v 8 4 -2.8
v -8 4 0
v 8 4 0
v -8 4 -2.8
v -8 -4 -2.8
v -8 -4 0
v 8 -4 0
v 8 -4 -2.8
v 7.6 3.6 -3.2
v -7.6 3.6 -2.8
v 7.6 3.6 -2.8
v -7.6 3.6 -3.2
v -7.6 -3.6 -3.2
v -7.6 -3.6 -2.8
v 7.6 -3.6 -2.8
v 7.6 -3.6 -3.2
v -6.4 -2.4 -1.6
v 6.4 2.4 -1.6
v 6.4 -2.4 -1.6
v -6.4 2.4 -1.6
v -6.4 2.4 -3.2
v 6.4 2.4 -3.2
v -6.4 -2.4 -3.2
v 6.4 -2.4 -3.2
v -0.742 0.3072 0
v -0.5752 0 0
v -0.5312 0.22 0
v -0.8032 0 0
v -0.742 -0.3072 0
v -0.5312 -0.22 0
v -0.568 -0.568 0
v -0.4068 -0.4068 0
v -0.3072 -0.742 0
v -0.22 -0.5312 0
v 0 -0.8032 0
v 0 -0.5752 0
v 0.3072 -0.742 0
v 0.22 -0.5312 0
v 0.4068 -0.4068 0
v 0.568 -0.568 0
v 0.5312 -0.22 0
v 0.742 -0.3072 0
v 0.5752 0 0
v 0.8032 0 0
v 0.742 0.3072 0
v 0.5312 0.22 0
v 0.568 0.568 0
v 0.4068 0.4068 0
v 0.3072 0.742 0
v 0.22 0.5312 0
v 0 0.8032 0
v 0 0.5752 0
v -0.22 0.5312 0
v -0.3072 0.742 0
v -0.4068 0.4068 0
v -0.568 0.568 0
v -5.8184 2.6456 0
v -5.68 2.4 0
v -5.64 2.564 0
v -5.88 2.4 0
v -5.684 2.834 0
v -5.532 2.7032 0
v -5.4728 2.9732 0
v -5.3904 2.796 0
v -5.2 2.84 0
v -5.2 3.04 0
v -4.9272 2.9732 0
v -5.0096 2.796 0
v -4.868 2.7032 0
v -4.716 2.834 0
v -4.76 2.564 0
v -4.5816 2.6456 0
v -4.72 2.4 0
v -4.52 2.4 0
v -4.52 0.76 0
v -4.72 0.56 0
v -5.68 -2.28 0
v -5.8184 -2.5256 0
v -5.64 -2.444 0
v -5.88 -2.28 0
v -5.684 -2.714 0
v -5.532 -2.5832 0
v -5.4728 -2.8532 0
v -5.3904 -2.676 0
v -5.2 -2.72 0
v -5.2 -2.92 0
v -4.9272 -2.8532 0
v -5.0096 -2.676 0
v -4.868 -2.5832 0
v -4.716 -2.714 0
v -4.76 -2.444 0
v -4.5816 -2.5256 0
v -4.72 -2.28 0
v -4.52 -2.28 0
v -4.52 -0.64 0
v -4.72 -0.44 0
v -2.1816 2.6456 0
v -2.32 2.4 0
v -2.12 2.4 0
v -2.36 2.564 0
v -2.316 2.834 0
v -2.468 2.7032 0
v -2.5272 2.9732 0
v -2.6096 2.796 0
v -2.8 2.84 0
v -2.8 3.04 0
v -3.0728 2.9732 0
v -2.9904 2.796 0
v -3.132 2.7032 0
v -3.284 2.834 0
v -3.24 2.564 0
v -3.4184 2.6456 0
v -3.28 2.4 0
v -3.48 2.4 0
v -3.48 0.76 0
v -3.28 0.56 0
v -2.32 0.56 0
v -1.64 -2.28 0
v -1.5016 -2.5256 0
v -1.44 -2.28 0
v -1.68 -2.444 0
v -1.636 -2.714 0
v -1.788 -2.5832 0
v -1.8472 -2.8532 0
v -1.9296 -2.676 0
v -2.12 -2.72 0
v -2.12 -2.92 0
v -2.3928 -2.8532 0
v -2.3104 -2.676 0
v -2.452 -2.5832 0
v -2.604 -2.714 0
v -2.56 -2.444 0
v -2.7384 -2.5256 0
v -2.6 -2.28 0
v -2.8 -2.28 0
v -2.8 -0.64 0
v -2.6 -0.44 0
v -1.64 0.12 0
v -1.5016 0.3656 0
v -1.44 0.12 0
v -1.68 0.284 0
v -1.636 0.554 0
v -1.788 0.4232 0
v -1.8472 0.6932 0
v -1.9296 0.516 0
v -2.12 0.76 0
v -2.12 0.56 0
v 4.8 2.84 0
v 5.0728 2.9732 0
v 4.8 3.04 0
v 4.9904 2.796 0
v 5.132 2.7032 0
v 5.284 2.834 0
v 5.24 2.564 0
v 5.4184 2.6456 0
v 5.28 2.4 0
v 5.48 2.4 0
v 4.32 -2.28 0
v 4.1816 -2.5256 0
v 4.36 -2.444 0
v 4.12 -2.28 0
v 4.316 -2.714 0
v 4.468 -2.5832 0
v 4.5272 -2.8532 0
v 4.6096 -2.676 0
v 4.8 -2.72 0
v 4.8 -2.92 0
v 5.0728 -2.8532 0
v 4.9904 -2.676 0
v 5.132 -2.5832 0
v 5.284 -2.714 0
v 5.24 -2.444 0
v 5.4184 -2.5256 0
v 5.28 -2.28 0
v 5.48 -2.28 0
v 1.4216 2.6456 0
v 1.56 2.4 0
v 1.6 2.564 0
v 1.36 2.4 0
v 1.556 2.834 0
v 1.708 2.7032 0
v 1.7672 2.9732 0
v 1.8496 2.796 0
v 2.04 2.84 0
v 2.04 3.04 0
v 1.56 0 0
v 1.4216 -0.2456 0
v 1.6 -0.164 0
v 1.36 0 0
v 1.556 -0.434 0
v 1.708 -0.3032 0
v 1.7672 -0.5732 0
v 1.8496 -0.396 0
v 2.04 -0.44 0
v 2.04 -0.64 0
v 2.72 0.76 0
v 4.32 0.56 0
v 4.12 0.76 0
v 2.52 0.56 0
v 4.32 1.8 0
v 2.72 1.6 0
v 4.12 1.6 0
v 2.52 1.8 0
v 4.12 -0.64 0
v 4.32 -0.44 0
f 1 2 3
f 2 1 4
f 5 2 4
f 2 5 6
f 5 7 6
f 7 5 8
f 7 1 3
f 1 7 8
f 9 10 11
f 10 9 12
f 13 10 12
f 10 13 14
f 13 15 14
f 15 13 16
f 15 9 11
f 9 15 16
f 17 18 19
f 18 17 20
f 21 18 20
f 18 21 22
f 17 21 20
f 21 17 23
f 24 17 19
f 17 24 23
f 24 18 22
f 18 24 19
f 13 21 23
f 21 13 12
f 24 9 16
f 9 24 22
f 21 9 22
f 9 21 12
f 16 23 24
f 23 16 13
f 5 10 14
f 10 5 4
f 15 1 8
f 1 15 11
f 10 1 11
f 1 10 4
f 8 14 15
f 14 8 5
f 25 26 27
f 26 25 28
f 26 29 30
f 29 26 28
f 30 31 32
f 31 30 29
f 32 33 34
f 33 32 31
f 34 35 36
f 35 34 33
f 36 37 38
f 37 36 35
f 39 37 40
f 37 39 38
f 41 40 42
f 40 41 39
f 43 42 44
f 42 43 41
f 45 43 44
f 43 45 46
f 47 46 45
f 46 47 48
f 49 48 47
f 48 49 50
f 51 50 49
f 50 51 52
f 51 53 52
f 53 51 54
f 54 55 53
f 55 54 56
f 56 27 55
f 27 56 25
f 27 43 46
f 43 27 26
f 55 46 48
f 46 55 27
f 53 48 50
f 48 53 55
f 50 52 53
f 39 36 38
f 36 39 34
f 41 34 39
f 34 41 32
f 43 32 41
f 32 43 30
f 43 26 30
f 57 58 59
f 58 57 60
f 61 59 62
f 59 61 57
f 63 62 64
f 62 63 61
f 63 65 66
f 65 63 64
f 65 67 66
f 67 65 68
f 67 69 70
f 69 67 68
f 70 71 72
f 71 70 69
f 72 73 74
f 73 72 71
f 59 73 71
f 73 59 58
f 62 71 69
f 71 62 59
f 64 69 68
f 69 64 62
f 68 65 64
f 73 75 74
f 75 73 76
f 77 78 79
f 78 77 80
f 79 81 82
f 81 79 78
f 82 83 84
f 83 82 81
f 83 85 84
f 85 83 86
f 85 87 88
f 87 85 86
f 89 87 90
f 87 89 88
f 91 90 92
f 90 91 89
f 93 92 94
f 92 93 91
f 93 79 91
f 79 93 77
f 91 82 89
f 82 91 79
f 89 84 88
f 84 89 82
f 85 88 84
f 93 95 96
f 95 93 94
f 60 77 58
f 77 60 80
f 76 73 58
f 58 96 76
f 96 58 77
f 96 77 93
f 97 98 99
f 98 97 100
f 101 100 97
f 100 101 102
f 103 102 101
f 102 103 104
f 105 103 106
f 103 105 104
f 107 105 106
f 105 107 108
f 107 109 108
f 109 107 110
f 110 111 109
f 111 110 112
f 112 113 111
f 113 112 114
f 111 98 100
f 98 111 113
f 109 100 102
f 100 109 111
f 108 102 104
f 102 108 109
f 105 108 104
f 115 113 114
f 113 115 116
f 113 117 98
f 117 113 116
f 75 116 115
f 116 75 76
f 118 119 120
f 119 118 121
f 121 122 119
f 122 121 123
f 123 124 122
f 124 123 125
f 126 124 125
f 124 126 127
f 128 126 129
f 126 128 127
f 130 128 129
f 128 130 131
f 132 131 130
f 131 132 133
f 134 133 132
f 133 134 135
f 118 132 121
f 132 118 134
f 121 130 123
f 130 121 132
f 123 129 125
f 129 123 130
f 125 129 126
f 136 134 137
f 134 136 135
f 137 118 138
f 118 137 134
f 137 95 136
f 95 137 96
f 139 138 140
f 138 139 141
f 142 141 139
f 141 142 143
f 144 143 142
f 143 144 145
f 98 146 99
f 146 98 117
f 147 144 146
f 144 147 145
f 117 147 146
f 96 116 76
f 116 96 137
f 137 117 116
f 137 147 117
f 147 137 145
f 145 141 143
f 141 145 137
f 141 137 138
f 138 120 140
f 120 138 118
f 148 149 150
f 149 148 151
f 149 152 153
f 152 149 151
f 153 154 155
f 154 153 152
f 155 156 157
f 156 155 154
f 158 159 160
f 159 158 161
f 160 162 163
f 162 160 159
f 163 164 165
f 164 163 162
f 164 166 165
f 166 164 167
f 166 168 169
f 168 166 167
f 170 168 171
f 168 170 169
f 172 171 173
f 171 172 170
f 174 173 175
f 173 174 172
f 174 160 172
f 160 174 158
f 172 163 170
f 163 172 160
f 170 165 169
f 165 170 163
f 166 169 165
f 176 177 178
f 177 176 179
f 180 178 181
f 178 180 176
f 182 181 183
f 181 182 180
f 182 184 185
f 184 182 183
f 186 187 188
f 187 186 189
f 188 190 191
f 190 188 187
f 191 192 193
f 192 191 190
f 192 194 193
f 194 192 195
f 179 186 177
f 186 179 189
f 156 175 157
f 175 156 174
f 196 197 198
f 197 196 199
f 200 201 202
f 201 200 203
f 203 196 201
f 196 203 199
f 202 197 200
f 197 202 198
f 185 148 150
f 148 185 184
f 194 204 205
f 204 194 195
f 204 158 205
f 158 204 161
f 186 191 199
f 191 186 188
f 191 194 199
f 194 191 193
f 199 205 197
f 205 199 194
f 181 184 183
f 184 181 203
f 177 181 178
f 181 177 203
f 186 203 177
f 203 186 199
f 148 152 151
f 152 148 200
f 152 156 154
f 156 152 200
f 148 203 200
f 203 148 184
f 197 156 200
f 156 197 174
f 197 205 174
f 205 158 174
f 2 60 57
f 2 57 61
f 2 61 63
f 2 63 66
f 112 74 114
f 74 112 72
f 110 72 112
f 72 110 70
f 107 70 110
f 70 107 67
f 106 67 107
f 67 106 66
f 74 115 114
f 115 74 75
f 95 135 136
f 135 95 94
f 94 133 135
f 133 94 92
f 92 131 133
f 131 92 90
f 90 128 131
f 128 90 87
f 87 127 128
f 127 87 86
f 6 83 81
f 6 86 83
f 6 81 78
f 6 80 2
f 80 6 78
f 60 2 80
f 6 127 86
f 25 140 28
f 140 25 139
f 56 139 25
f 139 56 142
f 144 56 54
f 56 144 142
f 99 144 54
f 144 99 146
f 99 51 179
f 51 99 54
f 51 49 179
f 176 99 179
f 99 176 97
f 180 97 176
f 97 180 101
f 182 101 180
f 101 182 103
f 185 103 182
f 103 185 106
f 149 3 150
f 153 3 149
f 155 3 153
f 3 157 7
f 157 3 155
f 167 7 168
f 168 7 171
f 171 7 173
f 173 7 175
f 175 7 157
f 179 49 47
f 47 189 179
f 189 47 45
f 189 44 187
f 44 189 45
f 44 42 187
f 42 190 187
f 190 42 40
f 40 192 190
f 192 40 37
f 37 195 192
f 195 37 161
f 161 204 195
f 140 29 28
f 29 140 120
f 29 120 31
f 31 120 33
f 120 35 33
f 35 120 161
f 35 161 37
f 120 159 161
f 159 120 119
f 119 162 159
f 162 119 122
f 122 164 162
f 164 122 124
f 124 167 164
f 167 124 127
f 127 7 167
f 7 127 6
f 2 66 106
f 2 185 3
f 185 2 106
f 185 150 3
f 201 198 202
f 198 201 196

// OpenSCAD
// file: ../p/box5.scad
use <../lib.scad>
function ldraw_lib__box5() = [
// 0 Box with 5 Faces and All Edges
// 0 Name: box5.dat
// 0 Author: James Jessiman
// 0 !LDRAW_ORG Primitive UPDATE 2012-01
// 0 !LICENSE Licensed under CC BY 2.0 and CC BY 4.0 : see CAreadme.txt
// 
// 0 BFC CERTIFY CCW
  [0,"BFC","CERTIFY"],
  [0,"BFC","CCW"],
// 
// 0 !HISTORY 2002-04-03 [sbliss] Modified for BFC compliance
// 0 !HISTORY 2002-04-25 [PTadmin] Official Update 2002-02
// 0 !HISTORY 2007-06-24 [PTadmin] Header formatted for Contributor Agreement
// 0 !HISTORY 2008-07-01 [PTadmin] Official Update 2008-01
// 0 !HISTORY 2012-02-16 [Philo] Changed to CCW
// 0 !HISTORY 2012-03-30 [PTadmin] Official Update 2012-01
// 
// 
// 2 24 1 1 1 -1 1 1
  [2,24,1,1,1,-1,1,1],
// 2 24 -1 1 1 -1 1 -1
  [2,24,-1,1,1,-1,1,-1],
// 2 24 -1 1 -1 1 1 -1
  [2,24,-1,1,-1,1,1,-1],
// 2 24 1 1 -1 1 1 1
  [2,24,1,1,-1,1,1,1],
// 2 24 1 0 1 -1 0 1
  [2,24,1,0,1,-1,0,1],
// 2 24 -1 0 1 -1 0 -1
  [2,24,-1,0,1,-1,0,-1],
// 2 24 -1 0 -1 1 0 -1
  [2,24,-1,0,-1,1,0,-1],
// 2 24 1 0 -1 1 0 1
  [2,24,1,0,-1,1,0,1],
// 2 24 1 0 1 1 1 1
  [2,24,1,0,1,1,1,1],
// 2 24 -1 0 1 -1 1 1
  [2,24,-1,0,1,-1,1,1],
// 2 24 1 0 -1 1 1 -1
  [2,24,1,0,-1,1,1,-1],
// 2 24 -1 0 -1 -1 1 -1
  [2,24,-1,0,-1,-1,1,-1],
// 4 16 -1 1 1 1 1 1 1 1 -1 -1 1 -1
  [4,16,-1,1,1,1,1,1,1,1,-1,-1,1,-1],
// 4 16 -1 1 1 -1 0 1 1 0 1 1 1 1
  [4,16,-1,1,1,-1,0,1,1,0,1,1,1,1],
// 4 16 -1 1 -1 -1 0 -1 -1 0 1 -1 1 1
  [4,16,-1,1,-1,-1,0,-1,-1,0,1,-1,1,1],
// 4 16 1 1 -1 1 0 -1 -1 0 -1 -1 1 -1
  [4,16,1,1,-1,1,0,-1,-1,0,-1,-1,1,-1],
// 4 16 1 1 1 1 0 1 1 0 -1 1 1 -1
  [4,16,1,1,1,1,0,1,1,0,-1,1,1,-1],
];
module ldraw_lib__box5(step=0, col=false, unit=2/5, alt=false, line=0.2, solid=!$preview)
    makepoly(ldraw_lib__box5(), step=step, col=col, unit=unit, alt=alt, line=line, solid=solid);
ldraw_lib__box5(line=0.2);
// file: ../p/box4.scad
use <../lib.scad>
function ldraw_lib__box4() = [
// 0 Box with 4 Faces (2 Parallel Pairs) and All Edges
// 0 Name: box4.dat
// 0 Author: James Jessiman
// 0 !LDRAW_ORG Primitive UPDATE 2012-01
// 0 !LICENSE Licensed under CC BY 2.0 and CC BY 4.0 : see CAreadme.txt
// 
// 0 BFC CERTIFY CCW
  [0,"BFC","CERTIFY"],
  [0,"BFC","CCW"],
// 
// 0 !HISTORY 2002-04-03 [sbliss] Modified for BFC compliance
// 0 !HISTORY 2002-04-25 [PTadmin] Official Update 2002-02
// 0 !HISTORY 2007-06-24 [PTadmin] Header formatted for Contributor Agreement
// 0 !HISTORY 2008-07-01 [PTadmin] Official Update 2008-01
// 0 !HISTORY 2012-02-16 [Philo] Changed to CCW
// 0 !HISTORY 2012-03-30 [PTadmin] Official Update 2012-01
// 
// 
// 2 24 1 1 1 -1 1 1
  [2,24,1,1,1,-1,1,1],
// 2 24 -1 1 1 -1 1 -1
  [2,24,-1,1,1,-1,1,-1],
// 2 24 -1 1 -1 1 1 -1
  [2,24,-1,1,-1,1,1,-1],
// 2 24 1 1 -1 1 1 1
  [2,24,1,1,-1,1,1,1],
// 2 24 1 0 1 -1 0 1
  [2,24,1,0,1,-1,0,1],
// 2 24 -1 0 1 -1 0 -1
  [2,24,-1,0,1,-1,0,-1],
// 2 24 -1 0 -1 1 0 -1
  [2,24,-1,0,-1,1,0,-1],
// 2 24 1 0 -1 1 0 1
  [2,24,1,0,-1,1,0,1],
// 2 24 1 0 1 1 1 1
  [2,24,1,0,1,1,1,1],
// 2 24 -1 0 1 -1 1 1
  [2,24,-1,0,1,-1,1,1],
// 2 24 1 0 -1 1 1 -1
  [2,24,1,0,-1,1,1,-1],
// 2 24 -1 0 -1 -1 1 -1
  [2,24,-1,0,-1,-1,1,-1],
// 4 16 -1 1 1 -1 0 1 1 0 1 1 1 1
  [4,16,-1,1,1,-1,0,1,1,0,1,1,1,1],
// 4 16 -1 1 -1 -1 0 -1 -1 0 1 -1 1 1
  [4,16,-1,1,-1,-1,0,-1,-1,0,1,-1,1,1],
// 4 16 1 1 -1 1 0 -1 -1 0 -1 -1 1 -1
  [4,16,1,1,-1,1,0,-1,-1,0,-1,-1,1,-1],
// 4 16 1 1 1 1 0 1 1 0 -1 1 1 -1
  [4,16,1,1,1,1,0,1,1,0,-1,1,1,-1],
];
module ldraw_lib__box4(step=0, col=false, unit=2/5, alt=false, line=0.2, solid=!$preview)
    makepoly(ldraw_lib__box4(), step=step, col=col, unit=unit, alt=alt, line=line, solid=solid);
ldraw_lib__box4(line=0.2);
// file: s/3069bs01.scad
use <../../lib.scad>
use <../../p/box4.scad>
use <../../p/box5.scad>
function ldraw_lib__s__3069bs01() = [
// 0 ~Tile  1 x  2 with Groove without Top Face
// 0 Name: s\3069bs01.dat
// 0 Author: Santeri Piippo [arezey]
// 0 !LDRAW_ORG Subpart UPDATE 2010-02
// 0 !LICENSE Licensed under CC BY 2.0 and CC BY 4.0 : see CAreadme.txt
// 
// 0 BFC CERTIFY CCW
  [0,"BFC","CERTIFY"],
  [0,"BFC","CCW"],
// 
// 0 !HISTORY 2010-07-05 [PTadmin] Official Update 2010-02
// 
// 
// 1 16 0 0 0 20 0 0 0 7 0 0 0 10 box4.dat
  [1,16,0,0,0,20,0,0,0,7,0,0,0,10, ldraw_lib__box4()],
// 1 16 0 7 0 19 0 0 0 1 0 0 0 9 box4.dat
  [1,16,0,7,0,19,0,0,0,1,0,0,0,9, ldraw_lib__box4()],
// 0 BFC INVERTNEXT
  [0,"BFC","INVERTNEXT"],
// 1 16 0 8 0 16 0 0 0 -4 0 0 0 6 box5.dat
  [1,16,0,8,0,16,0,0,0,-4,0,0,0,6, ldraw_lib__box5()],
// 4 16 -19 8 9 -16 8 6 -16 8 -6 -19 8 -9
  [4,16,-19,8,9,-16,8,6,-16,8,-6,-19,8,-9],
// 4 16 19 8 -9 16 8 -6 16 8 6 19 8 9
  [4,16,19,8,-9,16,8,-6,16,8,6,19,8,9],
// 4 16 19 8 9 16 8 6 -16 8 6 -19 8 9
  [4,16,19,8,9,16,8,6,-16,8,6,-19,8,9],
// 4 16 -19 8 -9 -16 8 -6 16 8 -6 19 8 -9
  [4,16,-19,8,-9,-16,8,-6,16,8,-6,19,8,-9],
// 4 16 -20 7 10 -19 7 9 -19 7 -9 -20 7 -10
  [4,16,-20,7,10,-19,7,9,-19,7,-9,-20,7,-10],
// 4 16 20 7 -10 19 7 -9 19 7 9 20 7 10
  [4,16,20,7,-10,19,7,-9,19,7,9,20,7,10],
// 4 16 20 7 10 19 7 9 -19 7 9 -20 7 10
  [4,16,20,7,10,19,7,9,-19,7,9,-20,7,10],
// 4 16 -20 7 -10 -19 7 -9 19 7 -9 20 7 -10
  [4,16,-20,7,-10,-19,7,-9,19,7,-9,20,7,-10],
// 0 //
];
module ldraw_lib__s__3069bs01(step=0, col=false, unit=2/5, alt=false, line=0.2, solid=!$preview)
    makepoly(ldraw_lib__s__3069bs01(), step=step, col=col, unit=unit, alt=alt, line=line, solid=solid);
ldraw_lib__s__3069bs01(line=0.2);
// main file
use <../lib.scad>
use <s/3069bs01.scad>
function ldraw_lib__3069bpxa() = [
// 0 Tile  1 x  2 with White "K-9" Pattern
// 0 Name: 3069bpxa.dat
// 0 Author: Evert-Jan Boer [ejboer]
// 0 !LDRAW_ORG Part UPDATE 2022-04
// 0 !LICENSE Licensed under CC BY 2.0 and CC BY 4.0 : see CAreadme.txt
// 
// 0 BFC CERTIFY CCW
  [0,"BFC","CERTIFY"],
  [0,"BFC","CCW"],
// 
// 0 !KEYWORDS Bricklink 3069bpb425, Doctor Who, Set 71204
// 
// 0 !HISTORY 2022-07-18 [PTadmin] Official Update 2022-04
// 
// 
// 1 16 0 0 0 1 0 0 0 1 0 0 0 1 s\3069bs01.dat
  [1,16,0,0,0,1,0,0,0,1,0,0,0,1, ldraw_lib__s__3069bs01()],
// 
// 4 72 -1.438 0 0 -1.328 0 .55 -1.855 0 .768 -2.008 0 0
  [4,72,-1.438,0,0,-1.328,0,.55,-1.855,0,.768,-2.008,0,0],
// 4 72 -1.328 0 -.55 -1.438 0 0 -2.008 0 0 -1.855 0 -.768
  [4,72,-1.328,0,-.55,-1.438,0,0,-2.008,0,0,-1.855,0,-.768],
// 4 72 -1.017 0 -1.017 -1.328 0 -.55 -1.855 0 -.768 -1.42 0 -1.42
  [4,72,-1.017,0,-1.017,-1.328,0,-.55,-1.855,0,-.768,-1.42,0,-1.42],
// 4 72 -.55 0 -1.328 -1.017 0 -1.017 -1.42 0 -1.42 -.768 0 -1.855
  [4,72,-.55,0,-1.328,-1.017,0,-1.017,-1.42,0,-1.42,-.768,0,-1.855],
// 4 72 0 0 -1.438 -.55 0 -1.328 -.768 0 -1.855 0 0 -2.008
  [4,72,0,0,-1.438,-.55,0,-1.328,-.768,0,-1.855,0,0,-2.008],
// 4 72 .55 0 -1.328 0 0 -1.438 0 0 -2.008 .768 0 -1.855
  [4,72,.55,0,-1.328,0,0,-1.438,0,0,-2.008,.768,0,-1.855],
// 4 72 1.017 0 -1.017 .55 0 -1.328 .768 0 -1.855 1.42 0 -1.42
  [4,72,1.017,0,-1.017,.55,0,-1.328,.768,0,-1.855,1.42,0,-1.42],
// 4 72 1.328 0 -.55 1.017 0 -1.017 1.42 0 -1.42 1.855 0 -.768
  [4,72,1.328,0,-.55,1.017,0,-1.017,1.42,0,-1.42,1.855,0,-.768],
// 4 72 1.438 0 0 1.328 0 -.55 1.855 0 -.768 2.008 0 0
  [4,72,1.438,0,0,1.328,0,-.55,1.855,0,-.768,2.008,0,0],
// 4 72 1.328 0 .55 1.438 0 0 2.008 0 0 1.855 0 .768
  [4,72,1.328,0,.55,1.438,0,0,2.008,0,0,1.855,0,.768],
// 4 72 1.017 0 1.017 1.328 0 .55 1.855 0 .768 1.42 0 1.42
  [4,72,1.017,0,1.017,1.328,0,.55,1.855,0,.768,1.42,0,1.42],
// 4 72 .55 0 1.328 1.017 0 1.017 1.42 0 1.42 .768 0 1.855
  [4,72,.55,0,1.328,1.017,0,1.017,1.42,0,1.42,.768,0,1.855],
// 4 72 0 0 1.438 .55 0 1.328 .768 0 1.855 0 0 2.008
  [4,72,0,0,1.438,.55,0,1.328,.768,0,1.855,0,0,2.008],
// 4 72 -.55 0 1.328 0 0 1.438 0 0 2.008 -.768 0 1.855
  [4,72,-.55,0,1.328,0,0,1.438,0,0,2.008,-.768,0,1.855],
// 4 72 -1.017 0 1.017 -.55 0 1.328 -.768 0 1.855 -1.42 0 1.42
  [4,72,-1.017,0,1.017,-.55,0,1.328,-.768,0,1.855,-1.42,0,1.42],
// 4 72 -1.328 0 .55 -1.017 0 1.017 -1.42 0 1.42 -1.855 0 .768
  [4,72,-1.328,0,.55,-1.017,0,1.017,-1.42,0,1.42,-1.855,0,.768],
// 4 15 -1.328 0 .55 -1.438 0 0 1.438 0 0 1.328 0 .55
  [4,15,-1.328,0,.55,-1.438,0,0,1.438,0,0,1.328,0,.55],
// 4 15 -1.017 0 1.017 -1.328 0 .55 1.328 0 .55 1.017 0 1.017
  [4,15,-1.017,0,1.017,-1.328,0,.55,1.328,0,.55,1.017,0,1.017],
// 4 15 -.55 0 1.328 -1.017 0 1.017 1.017 0 1.017 .55 0 1.328
  [4,15,-.55,0,1.328,-1.017,0,1.017,1.017,0,1.017,.55,0,1.328],
// 3 15 .55 0 1.328 0 0 1.438 -.55 0 1.328
  [3,15,.55,0,1.328,0,0,1.438,-.55,0,1.328],
// 4 15 -.55 0 -1.328 0 0 -1.438 .55 0 -1.328 1.017 0 -1.017
  [4,15,-.55,0,-1.328,0,0,-1.438,.55,0,-1.328,1.017,0,-1.017],
// 4 15 -1.017 0 -1.017 -.55 0 -1.328 1.017 0 -1.017 1.328 0 -.55
  [4,15,-1.017,0,-1.017,-.55,0,-1.328,1.017,0,-1.017,1.328,0,-.55],
// 4 15 -1.328 0 -.55 -1.017 0 -1.017 1.328 0 -.55 1.438 0 0
  [4,15,-1.328,0,-.55,-1.017,0,-1.017,1.328,0,-.55,1.438,0,0],
// 3 15 1.438 0 0 -1.438 0 0 -1.328 0 -.55
  [3,15,1.438,0,0,-1.438,0,0,-1.328,0,-.55],
// 4 72 -14.546 0 6.614 -14.7 0 6 -14.2 0 6 -14.1 0 6.41
  [4,72,-14.546,0,6.614,-14.7,0,6,-14.2,0,6,-14.1,0,6.41],
// 4 72 -14.21 0 7.085 -14.546 0 6.614 -14.1 0 6.41 -13.83 0 6.758
  [4,72,-14.21,0,7.085,-14.546,0,6.614,-14.1,0,6.41,-13.83,0,6.758],
// 4 72 -13.682 0 7.433 -14.21 0 7.085 -13.83 0 6.758 -13.476 0 6.99
  [4,72,-13.682,0,7.433,-14.21,0,7.085,-13.83,0,6.758,-13.476,0,6.99],
// 4 72 -13 0 7.6 -13.682 0 7.433 -13.476 0 6.99 -13 0 7.1
  [4,72,-13,0,7.6,-13.682,0,7.433,-13.476,0,6.99,-13,0,7.1],
// 4 72 -13 0 7.6 -13 0 7.1 -12.524 0 6.99 -12.318 0 7.433
  [4,72,-13,0,7.6,-13,0,7.1,-12.524,0,6.99,-12.318,0,7.433],
// 4 72 -11.79 0 7.085 -12.318 0 7.433 -12.524 0 6.99 -12.17 0 6.758
  [4,72,-11.79,0,7.085,-12.318,0,7.433,-12.524,0,6.99,-12.17,0,6.758],
// 4 72 -11.454 0 6.614 -11.79 0 7.085 -12.17 0 6.758 -11.9 0 6.41
  [4,72,-11.454,0,6.614,-11.79,0,7.085,-12.17,0,6.758,-11.9,0,6.41],
// 4 72 -11.9 0 6.41 -11.8 0 6 -11.3 0 6 -11.454 0 6.614
  [4,72,-11.9,0,6.41,-11.8,0,6,-11.3,0,6,-11.454,0,6.614],
// 4 15 -14.1 0 6.41 -14.2 0 6 -11.8 0 6 -11.9 0 6.41
  [4,15,-14.1,0,6.41,-14.2,0,6,-11.8,0,6,-11.9,0,6.41],
// 4 15 -13.83 0 6.758 -14.1 0 6.41 -11.9 0 6.41 -12.17 0 6.758
  [4,15,-13.83,0,6.758,-14.1,0,6.41,-11.9,0,6.41,-12.17,0,6.758],
// 4 15 -13.476 0 6.99 -13.83 0 6.758 -12.17 0 6.758 -12.524 0 6.99
  [4,15,-13.476,0,6.99,-13.83,0,6.758,-12.17,0,6.758,-12.524,0,6.99],
// 3 15 -12.524 0 6.99 -13 0 7.1 -13.476 0 6.99
  [3,15,-12.524,0,6.99,-13,0,7.1,-13.476,0,6.99],
// 4 72 -11.3 0 6 -11.8 0 6 -11.8 0 1.4 -11.3 0 1.9
  [4,72,-11.3,0,6,-11.8,0,6,-11.8,0,1.4,-11.3,0,1.9],
// 4 72 -14.2 0 -5.7 -14.7 0 -5.7 -14.546 0 -6.314 -14.1 0 -6.11
  [4,72,-14.2,0,-5.7,-14.7,0,-5.7,-14.546,0,-6.314,-14.1,0,-6.11],
// 4 72 -14.1 0 -6.11 -14.546 0 -6.314 -14.21 0 -6.785 -13.83 0 -6.458
  [4,72,-14.1,0,-6.11,-14.546,0,-6.314,-14.21,0,-6.785,-13.83,0,-6.458],
// 4 72 -13.83 0 -6.458 -14.21 0 -6.785 -13.682 0 -7.133 -13.476 0 -6.69
  [4,72,-13.83,0,-6.458,-14.21,0,-6.785,-13.682,0,-7.133,-13.476,0,-6.69],
// 4 72 -13.476 0 -6.69 -13.682 0 -7.133 -13 0 -7.3 -13 0 -6.8
  [4,72,-13.476,0,-6.69,-13.682,0,-7.133,-13,0,-7.3,-13,0,-6.8],
// 4 72 -12.524 0 -6.69 -13 0 -6.8 -13 0 -7.3 -12.318 0 -7.133
  [4,72,-12.524,0,-6.69,-13,0,-6.8,-13,0,-7.3,-12.318,0,-7.133],
// 4 72 -12.524 0 -6.69 -12.318 0 -7.133 -11.79 0 -6.785 -12.17 0 -6.458
  [4,72,-12.524,0,-6.69,-12.318,0,-7.133,-11.79,0,-6.785,-12.17,0,-6.458],
// 4 72 -12.17 0 -6.458 -11.79 0 -6.785 -11.454 0 -6.314 -11.9 0 -6.11
  [4,72,-12.17,0,-6.458,-11.79,0,-6.785,-11.454,0,-6.314,-11.9,0,-6.11],
// 4 72 -11.3 0 -5.7 -11.8 0 -5.7 -11.9 0 -6.11 -11.454 0 -6.314
  [4,72,-11.3,0,-5.7,-11.8,0,-5.7,-11.9,0,-6.11,-11.454,0,-6.314],
// 4 15 -11.8 0 -5.7 -14.2 0 -5.7 -14.1 0 -6.11 -11.9 0 -6.11
  [4,15,-11.8,0,-5.7,-14.2,0,-5.7,-14.1,0,-6.11,-11.9,0,-6.11],
// 4 15 -11.9 0 -6.11 -14.1 0 -6.11 -13.83 0 -6.458 -12.17 0 -6.458
  [4,15,-11.9,0,-6.11,-14.1,0,-6.11,-13.83,0,-6.458,-12.17,0,-6.458],
// 4 15 -12.17 0 -6.458 -13.83 0 -6.458 -13.476 0 -6.69 -12.524 0 -6.69
  [4,15,-12.17,0,-6.458,-13.83,0,-6.458,-13.476,0,-6.69,-12.524,0,-6.69],
// 3 15 -13 0 -6.8 -12.524 0 -6.69 -13.476 0 -6.69
  [3,15,-13,0,-6.8,-12.524,0,-6.69,-13.476,0,-6.69],
// 4 72 -11.8 0 -1.1 -11.8 0 -5.7 -11.3 0 -5.7 -11.3 0 -1.6
  [4,72,-11.8,0,-1.1,-11.8,0,-5.7,-11.3,0,-5.7,-11.3,0,-1.6],
// 4 72 -14.2 0 6 -14.7 0 6 -14.7 0 -5.7 -14.2 0 -5.7
  [4,72,-14.2,0,6,-14.7,0,6,-14.7,0,-5.7,-14.2,0,-5.7],
// 3 15 -11.8 0 1.4 -11.8 0 6 -14.2 0 6
  [3,15,-11.8,0,1.4,-11.8,0,6,-14.2,0,6],
// 4 15 -11.8 0 -1.1 -11.8 0 1.4 -14.2 0 6 -14.2 0 -5.7
  [4,15,-11.8,0,-1.1,-11.8,0,1.4,-14.2,0,6,-14.2,0,-5.7],
// 3 15 -11.8 0 -1.1 -14.2 0 -5.7 -11.8 0 -5.7
  [3,15,-11.8,0,-1.1,-14.2,0,-5.7,-11.8,0,-5.7],
// 4 72 -5.8 0 6 -5.3 0 6 -5.454 0 6.614 -5.9 0 6.41
  [4,72,-5.8,0,6,-5.3,0,6,-5.454,0,6.614,-5.9,0,6.41],
// 4 72 -5.9 0 6.41 -5.454 0 6.614 -5.79 0 7.085 -6.17 0 6.758
  [4,72,-5.9,0,6.41,-5.454,0,6.614,-5.79,0,7.085,-6.17,0,6.758],
// 4 72 -6.17 0 6.758 -5.79 0 7.085 -6.318 0 7.433 -6.524 0 6.99
  [4,72,-6.17,0,6.758,-5.79,0,7.085,-6.318,0,7.433,-6.524,0,6.99],
// 4 72 -6.524 0 6.99 -6.318 0 7.433 -7 0 7.6 -7 0 7.1
  [4,72,-6.524,0,6.99,-6.318,0,7.433,-7,0,7.6,-7,0,7.1],
// 4 72 -7.476 0 6.99 -7 0 7.1 -7 0 7.6 -7.682 0 7.433
  [4,72,-7.476,0,6.99,-7,0,7.1,-7,0,7.6,-7.682,0,7.433],
// 4 72 -7.476 0 6.99 -7.682 0 7.433 -8.21 0 7.085 -7.83 0 6.758
  [4,72,-7.476,0,6.99,-7.682,0,7.433,-8.21,0,7.085,-7.83,0,6.758],
// 4 72 -7.83 0 6.758 -8.21 0 7.085 -8.546 0 6.614 -8.1 0 6.41
  [4,72,-7.83,0,6.758,-8.21,0,7.085,-8.546,0,6.614,-8.1,0,6.41],
// 4 72 -8.7 0 6 -8.2 0 6 -8.1 0 6.41 -8.546 0 6.614
  [4,72,-8.7,0,6,-8.2,0,6,-8.1,0,6.41,-8.546,0,6.614],
// 4 15 -8.2 0 6 -5.8 0 6 -5.9 0 6.41 -8.1 0 6.41
  [4,15,-8.2,0,6,-5.8,0,6,-5.9,0,6.41,-8.1,0,6.41],
// 4 15 -8.1 0 6.41 -5.9 0 6.41 -6.17 0 6.758 -7.83 0 6.758
  [4,15,-8.1,0,6.41,-5.9,0,6.41,-6.17,0,6.758,-7.83,0,6.758],
// 4 15 -7.83 0 6.758 -6.17 0 6.758 -6.524 0 6.99 -7.476 0 6.99
  [4,15,-7.83,0,6.758,-6.17,0,6.758,-6.524,0,6.99,-7.476,0,6.99],
// 3 15 -7 0 7.1 -7.476 0 6.99 -6.524 0 6.99
  [3,15,-7,0,7.1,-7.476,0,6.99,-6.524,0,6.99],
// 4 72 -8.2 0 1.4 -8.2 0 6 -8.7 0 6 -8.7 0 1.9
  [4,72,-8.2,0,1.4,-8.2,0,6,-8.7,0,6,-8.7,0,1.9],
// 4 15 -5.8 0 6 -8.2 0 6 -8.2 0 1.4 -5.8 0 1.4
  [4,15,-5.8,0,6,-8.2,0,6,-8.2,0,1.4,-5.8,0,1.4],
// 4 72 -11.3 0 1.9 -11.8 0 1.4 -8.2 0 1.4 -8.7 0 1.9
  [4,72,-11.3,0,1.9,-11.8,0,1.4,-8.2,0,1.4,-8.7,0,1.9],
// 4 72 -3.754 0 -6.314 -3.6 0 -5.7 -4.1 0 -5.7 -4.2 0 -6.11
  [4,72,-3.754,0,-6.314,-3.6,0,-5.7,-4.1,0,-5.7,-4.2,0,-6.11],
// 4 72 -4.09 0 -6.785 -3.754 0 -6.314 -4.2 0 -6.11 -4.47 0 -6.458
  [4,72,-4.09,0,-6.785,-3.754,0,-6.314,-4.2,0,-6.11,-4.47,0,-6.458],
// 4 72 -4.618 0 -7.133 -4.09 0 -6.785 -4.47 0 -6.458 -4.824 0 -6.69
  [4,72,-4.618,0,-7.133,-4.09,0,-6.785,-4.47,0,-6.458,-4.824,0,-6.69],
// 4 72 -5.3 0 -7.3 -4.618 0 -7.133 -4.824 0 -6.69 -5.3 0 -6.8
  [4,72,-5.3,0,-7.3,-4.618,0,-7.133,-4.824,0,-6.69,-5.3,0,-6.8],
// 4 72 -5.3 0 -7.3 -5.3 0 -6.8 -5.776 0 -6.69 -5.982 0 -7.133
  [4,72,-5.3,0,-7.3,-5.3,0,-6.8,-5.776,0,-6.69,-5.982,0,-7.133],
// 4 72 -6.51 0 -6.785 -5.982 0 -7.133 -5.776 0 -6.69 -6.13 0 -6.458
  [4,72,-6.51,0,-6.785,-5.982,0,-7.133,-5.776,0,-6.69,-6.13,0,-6.458],
// 4 72 -6.846 0 -6.314 -6.51 0 -6.785 -6.13 0 -6.458 -6.4 0 -6.11
  [4,72,-6.846,0,-6.314,-6.51,0,-6.785,-6.13,0,-6.458,-6.4,0,-6.11],
// 4 72 -6.4 0 -6.11 -6.5 0 -5.7 -7 0 -5.7 -6.846 0 -6.314
  [4,72,-6.4,0,-6.11,-6.5,0,-5.7,-7,0,-5.7,-6.846,0,-6.314],
// 4 15 -4.2 0 -6.11 -4.1 0 -5.7 -6.5 0 -5.7 -6.4 0 -6.11
  [4,15,-4.2,0,-6.11,-4.1,0,-5.7,-6.5,0,-5.7,-6.4,0,-6.11],
// 4 15 -4.47 0 -6.458 -4.2 0 -6.11 -6.4 0 -6.11 -6.13 0 -6.458
  [4,15,-4.47,0,-6.458,-4.2,0,-6.11,-6.4,0,-6.11,-6.13,0,-6.458],
// 4 15 -4.824 0 -6.69 -4.47 0 -6.458 -6.13 0 -6.458 -5.776 0 -6.69
  [4,15,-4.824,0,-6.69,-4.47,0,-6.458,-6.13,0,-6.458,-5.776,0,-6.69],
// 3 15 -4.824 0 -6.69 -5.776 0 -6.69 -5.3 0 -6.8
  [3,15,-4.824,0,-6.69,-5.776,0,-6.69,-5.3,0,-6.8],
// 4 72 -7 0 -5.7 -6.5 0 -5.7 -6.5 0 -1.1 -7 0 -1.6
  [4,72,-7,0,-5.7,-6.5,0,-5.7,-6.5,0,-1.1,-7,0,-1.6],
// 4 15 -6.5 0 -1.1 -6.5 0 -5.7 -4.1 0 -5.7 -4.1 0 .3
  [4,15,-6.5,0,-1.1,-6.5,0,-5.7,-4.1,0,-5.7,-4.1,0,.3],
// 4 72 -11.8 0 -1.1 -11.3 0 -1.6 -7 0 -1.6 -6.5 0 -1.1
  [4,72,-11.8,0,-1.1,-11.3,0,-1.6,-7,0,-1.6,-6.5,0,-1.1],
// 4 72 -4.1 0 .3 -3.6 0 .3 -3.754 0 .914 -4.2 0 .71
  [4,72,-4.1,0,.3,-3.6,0,.3,-3.754,0,.914,-4.2,0,.71],
// 4 72 -4.2 0 .71 -3.754 0 .914 -4.09 0 1.385 -4.47 0 1.058
  [4,72,-4.2,0,.71,-3.754,0,.914,-4.09,0,1.385,-4.47,0,1.058],
// 4 72 -4.47 0 1.058 -4.09 0 1.385 -4.618 0 1.733 -4.824 0 1.29
  [4,72,-4.47,0,1.058,-4.09,0,1.385,-4.618,0,1.733,-4.824,0,1.29],
// 4 72 -5.8 0 6 -5.8 0 1.4 -5.3 0 1.9 -5.3 0 6
  [4,72,-5.8,0,6,-5.8,0,1.4,-5.3,0,1.9,-5.3,0,6],
// 4 72 -5.3 0 1.4 -4.824 0 1.29 -4.618 0 1.733 -5.3 0 1.9
  [4,72,-5.3,0,1.4,-4.824,0,1.29,-4.618,0,1.733,-5.3,0,1.9],
// 3 72 -5.8 0 1.4 -5.3 0 1.4 -5.3 0 1.9
  [3,72,-5.8,0,1.4,-5.3,0,1.4,-5.3,0,1.9],
// 4 15 -8.2 0 1.4 -11.8 0 1.4 -11.8 0 -1.1 -6.5 0 -1.1
  [4,15,-8.2,0,1.4,-11.8,0,1.4,-11.8,0,-1.1,-6.5,0,-1.1],
// 3 15 -6.5 0 -1.1 -5.8 0 1.4 -8.2 0 1.4
  [3,15,-6.5,0,-1.1,-5.8,0,1.4,-8.2,0,1.4],
// 4 15 -5.3 0 1.4 -5.8 0 1.4 -6.5 0 -1.1 -4.824 0 1.29
  [4,15,-5.3,0,1.4,-5.8,0,1.4,-6.5,0,-1.1,-4.824,0,1.29],
// 4 15 -4.47 0 1.058 -4.824 0 1.29 -6.5 0 -1.1 -4.2 0 .71
  [4,15,-4.47,0,1.058,-4.824,0,1.29,-6.5,0,-1.1,-4.2,0,.71],
// 3 15 -4.2 0 .71 -6.5 0 -1.1 -4.1 0 .3
  [3,15,-4.2,0,.71,-6.5,0,-1.1,-4.1,0,.3],
// 4 72 -3.6 0 .3 -4.1 0 .3 -4.1 0 -5.7 -3.6 0 -5.7
  [4,72,-3.6,0,.3,-4.1,0,.3,-4.1,0,-5.7,-3.6,0,-5.7],
// 4 72 12 0 7.6 12 0 7.1 12.476 0 6.99 12.682 0 7.433
  [4,72,12,0,7.6,12,0,7.1,12.476,0,6.99,12.682,0,7.433],
// 4 72 13.21 0 7.085 12.682 0 7.433 12.476 0 6.99 12.83 0 6.758
  [4,72,13.21,0,7.085,12.682,0,7.433,12.476,0,6.99,12.83,0,6.758],
// 4 72 13.546 0 6.614 13.21 0 7.085 12.83 0 6.758 13.1 0 6.41
  [4,72,13.546,0,6.614,13.21,0,7.085,12.83,0,6.758,13.1,0,6.41],
// 4 72 13.1 0 6.41 13.2 0 6 13.7 0 6 13.546 0 6.614
  [4,72,13.1,0,6.41,13.2,0,6,13.7,0,6,13.546,0,6.614],
// 4 72 10.8 0 -5.7 10.3 0 -5.7 10.454 0 -6.314 10.9 0 -6.11
  [4,72,10.8,0,-5.7,10.3,0,-5.7,10.454,0,-6.314,10.9,0,-6.11],
// 4 72 10.9 0 -6.11 10.454 0 -6.314 10.79 0 -6.785 11.17 0 -6.458
  [4,72,10.9,0,-6.11,10.454,0,-6.314,10.79,0,-6.785,11.17,0,-6.458],
// 4 72 11.17 0 -6.458 10.79 0 -6.785 11.318 0 -7.133 11.524 0 -6.69
  [4,72,11.17,0,-6.458,10.79,0,-6.785,11.318,0,-7.133,11.524,0,-6.69],
// 4 72 11.524 0 -6.69 11.318 0 -7.133 12 0 -7.3 12 0 -6.8
  [4,72,11.524,0,-6.69,11.318,0,-7.133,12,0,-7.3,12,0,-6.8],
// 4 72 12.476 0 -6.69 12 0 -6.8 12 0 -7.3 12.682 0 -7.133
  [4,72,12.476,0,-6.69,12,0,-6.8,12,0,-7.3,12.682,0,-7.133],
// 4 72 12.476 0 -6.69 12.682 0 -7.133 13.21 0 -6.785 12.83 0 -6.458
  [4,72,12.476,0,-6.69,12.682,0,-7.133,13.21,0,-6.785,12.83,0,-6.458],
// 4 72 12.83 0 -6.458 13.21 0 -6.785 13.546 0 -6.314 13.1 0 -6.11
  [4,72,12.83,0,-6.458,13.21,0,-6.785,13.546,0,-6.314,13.1,0,-6.11],
// 4 72 13.7 0 -5.7 13.2 0 -5.7 13.1 0 -6.11 13.546 0 -6.314
  [4,72,13.7,0,-5.7,13.2,0,-5.7,13.1,0,-6.11,13.546,0,-6.314],
// 4 15 13.2 0 -5.7 10.8 0 -5.7 10.9 0 -6.11 13.1 0 -6.11
  [4,15,13.2,0,-5.7,10.8,0,-5.7,10.9,0,-6.11,13.1,0,-6.11],
// 4 15 13.1 0 -6.11 10.9 0 -6.11 11.17 0 -6.458 12.83 0 -6.458
  [4,15,13.1,0,-6.11,10.9,0,-6.11,11.17,0,-6.458,12.83,0,-6.458],
// 4 15 12.83 0 -6.458 11.17 0 -6.458 11.524 0 -6.69 12.476 0 -6.69
  [4,15,12.83,0,-6.458,11.17,0,-6.458,11.524,0,-6.69,12.476,0,-6.69],
// 3 15 12 0 -6.8 12.476 0 -6.69 11.524 0 -6.69
  [3,15,12,0,-6.8,12.476,0,-6.69,11.524,0,-6.69],
// 4 72 3.554 0 6.614 3.4 0 6 3.9 0 6 4 0 6.41
  [4,72,3.554,0,6.614,3.4,0,6,3.9,0,6,4,0,6.41],
// 4 72 3.89 0 7.085 3.554 0 6.614 4 0 6.41 4.27 0 6.758
  [4,72,3.89,0,7.085,3.554,0,6.614,4,0,6.41,4.27,0,6.758],
// 4 72 4.418 0 7.433 3.89 0 7.085 4.27 0 6.758 4.624 0 6.99
  [4,72,4.418,0,7.433,3.89,0,7.085,4.27,0,6.758,4.624,0,6.99],
// 4 72 5.1 0 7.6 4.418 0 7.433 4.624 0 6.99 5.1 0 7.1
  [4,72,5.1,0,7.6,4.418,0,7.433,4.624,0,6.99,5.1,0,7.1],
// 4 72 3.9 0 0 3.4 0 0 3.554 0 -.614 4 0 -.41
  [4,72,3.9,0,0,3.4,0,0,3.554,0,-.614,4,0,-.41],
// 4 72 4 0 -.41 3.554 0 -.614 3.89 0 -1.085 4.27 0 -.758
  [4,72,4,0,-.41,3.554,0,-.614,3.89,0,-1.085,4.27,0,-.758],
// 4 72 4.27 0 -.758 3.89 0 -1.085 4.418 0 -1.433 4.624 0 -.99
  [4,72,4.27,0,-.758,3.89,0,-1.085,4.418,0,-1.433,4.624,0,-.99],
// 4 72 4.624 0 -.99 4.418 0 -1.433 5.1 0 -1.6 5.1 0 -1.1
  [4,72,4.624,0,-.99,4.418,0,-1.433,5.1,0,-1.6,5.1,0,-1.1],
// 4 72 3.9 0 6 3.4 0 6 3.4 0 0 3.9 0 0
  [4,72,3.9,0,6,3.4,0,6,3.4,0,0,3.9,0,0],
// 4 72 13.7 0 6 13.2 0 6 13.2 0 -5.7 13.7 0 -5.7
  [4,72,13.7,0,6,13.2,0,6,13.2,0,-5.7,13.7,0,-5.7],
// 4 72 6.8 0 1.9 6.3 0 1.4 10.8 0 1.4 10.3 0 1.9
  [4,72,6.8,0,1.9,6.3,0,1.4,10.8,0,1.4,10.3,0,1.9],
// 4 72 10.8 0 4.5 6.3 0 4.5 6.8 0 4 10.3 0 4
  [4,72,10.8,0,4.5,6.3,0,4.5,6.8,0,4,10.3,0,4],
// 4 72 6.3 0 4.5 6.3 0 1.4 6.8 0 1.9 6.8 0 4
  [4,72,6.3,0,4.5,6.3,0,1.4,6.8,0,1.9,6.8,0,4],
// 4 72 10.3 0 4 10.3 0 1.9 10.8 0 1.4 10.8 0 4.5
  [4,72,10.3,0,4,10.3,0,1.9,10.8,0,1.4,10.8,0,4.5],
// 4 72 12 0 7.6 5.1 0 7.6 5.1 0 7.1 12 0 7.1
  [4,72,12,0,7.6,5.1,0,7.6,5.1,0,7.1,12,0,7.1],
// 4 72 5.1 0 -1.1 5.1 0 -1.6 10.3 0 -1.6 10.8 0 -1.1
  [4,72,5.1,0,-1.1,5.1,0,-1.6,10.3,0,-1.6,10.8,0,-1.1],
// 4 72 10.3 0 -1.6 10.3 0 -5.7 10.8 0 -5.7 10.8 0 -1.1
  [4,72,10.3,0,-1.6,10.3,0,-5.7,10.8,0,-5.7,10.8,0,-1.1],
// 4 15 6.3 0 1.4 3.9 0 0 4 0 -.41 4.27 0 -.758
  [4,15,6.3,0,1.4,3.9,0,0,4,0,-.41,4.27,0,-.758],
// 4 15 6.3 0 1.4 4.27 0 -.758 4.624 0 -.99 5.1 0 -1.1
  [4,15,6.3,0,1.4,4.27,0,-.758,4.624,0,-.99,5.1,0,-1.1],
// 4 15 10.8 0 1.4 6.3 0 1.4 5.1 0 -1.1 10.8 0 -1.1
  [4,15,10.8,0,1.4,6.3,0,1.4,5.1,0,-1.1,10.8,0,-1.1],
// 4 15 6.3 0 4.5 5.1 0 7.1 4.624 0 6.99 4.27 0 6.758
  [4,15,6.3,0,4.5,5.1,0,7.1,4.624,0,6.99,4.27,0,6.758],
// 4 15 6.3 0 4.5 4.27 0 6.758 4 0 6.41 3.9 0 6
  [4,15,6.3,0,4.5,4.27,0,6.758,4,0,6.41,3.9,0,6],
// 4 15 6.3 0 4.5 3.9 0 6 3.9 0 0 6.3 0 1.4
  [4,15,6.3,0,4.5,3.9,0,6,3.9,0,0,6.3,0,1.4],
// 4 15 12.476 0 6.99 12 0 7.1 10.8 0 4.5 12.83 0 6.758
  [4,15,12.476,0,6.99,12,0,7.1,10.8,0,4.5,12.83,0,6.758],
// 4 15 13.1 0 6.41 12.83 0 6.758 10.8 0 4.5 13.2 0 6
  [4,15,13.1,0,6.41,12.83,0,6.758,10.8,0,4.5,13.2,0,6],
// 4 15 5.1 0 7.1 6.3 0 4.5 10.8 0 4.5 12 0 7.1
  [4,15,5.1,0,7.1,6.3,0,4.5,10.8,0,4.5,12,0,7.1],
// 4 15 13.2 0 6 10.8 0 4.5 10.8 0 1.4 13.2 0 -5.7
  [4,15,13.2,0,6,10.8,0,4.5,10.8,0,1.4,13.2,0,-5.7],
// 3 15 10.8 0 1.4 10.8 0 -1.1 13.2 0 -5.7
  [3,15,10.8,0,1.4,10.8,0,-1.1,13.2,0,-5.7],
// 3 15 10.8 0 -1.1 10.8 0 -5.7 13.2 0 -5.7
  [3,15,10.8,0,-1.1,10.8,0,-5.7,13.2,0,-5.7],
// 3 16 -20 0 10 -14.7 0 6 -14.546 0 6.614
  [3,16,-20,0,10,-14.7,0,6,-14.546,0,6.614],
// 3 16 -20 0 10 -14.546 0 6.614 -14.21 0 7.085
  [3,16,-20,0,10,-14.546,0,6.614,-14.21,0,7.085],
// 3 16 -20 0 10 -14.21 0 7.085 -13.682 0 7.433
  [3,16,-20,0,10,-14.21,0,7.085,-13.682,0,7.433],
// 3 16 -20 0 10 -13.682 0 7.433 -13 0 7.6
  [3,16,-20,0,10,-13.682,0,7.433,-13,0,7.6],
// 4 16 -11.454 0 6.614 -11.3 0 6 -8.7 0 6 -8.546 0 6.614
  [4,16,-11.454,0,6.614,-11.3,0,6,-8.7,0,6,-8.546,0,6.614],
// 4 16 -11.79 0 7.085 -11.454 0 6.614 -8.546 0 6.614 -8.21 0 7.085
  [4,16,-11.79,0,7.085,-11.454,0,6.614,-8.546,0,6.614,-8.21,0,7.085],
// 4 16 -12.318 0 7.433 -11.79 0 7.085 -8.21 0 7.085 -7.682 0 7.433
  [4,16,-12.318,0,7.433,-11.79,0,7.085,-8.21,0,7.085,-7.682,0,7.433],
// 4 16 -13 0 7.6 -12.318 0 7.433 -7.682 0 7.433 -7 0 7.6
  [4,16,-13,0,7.6,-12.318,0,7.433,-7.682,0,7.433,-7,0,7.6],
// 4 16 -8.7 0 6 -11.3 0 6 -11.3 0 1.9 -8.7 0 1.9
  [4,16,-8.7,0,6,-11.3,0,6,-11.3,0,1.9,-8.7,0,1.9],
// 4 16 -7 0 -1.6 -11.3 0 -1.6 -11.3 0 -5.7 -7 0 -5.7
  [4,16,-7,0,-1.6,-11.3,0,-1.6,-11.3,0,-5.7,-7,0,-5.7],
// 4 16 -11.3 0 -5.7 -11.454 0 -6.314 -6.846 0 -6.314 -7 0 -5.7
  [4,16,-11.3,0,-5.7,-11.454,0,-6.314,-6.846,0,-6.314,-7,0,-5.7],
// 4 16 -6.846 0 -6.314 -11.454 0 -6.314 -11.79 0 -6.785 -6.51 0 -6.785
  [4,16,-6.846,0,-6.314,-11.454,0,-6.314,-11.79,0,-6.785,-6.51,0,-6.785],
// 4 16 -6.51 0 -6.785 -11.79 0 -6.785 -12.318 0 -7.133 -5.982 0 -7.133
  [4,16,-6.51,0,-6.785,-11.79,0,-6.785,-12.318,0,-7.133,-5.982,0,-7.133],
// 4 16 -5.982 0 -7.133 -12.318 0 -7.133 -13 0 -7.3 -5.3 0 -7.3
  [4,16,-5.982,0,-7.133,-12.318,0,-7.133,-13,0,-7.3,-5.3,0,-7.3],
// 3 16 -20 0 -10 -13.682 0 -7.133 -14.21 0 -6.785
  [3,16,-20,0,-10,-13.682,0,-7.133,-14.21,0,-6.785],
// 3 16 -20 0 -10 -13 0 -7.3 -13.682 0 -7.133
  [3,16,-20,0,-10,-13,0,-7.3,-13.682,0,-7.133],
// 3 16 -20 0 -10 -14.21 0 -6.785 -14.546 0 -6.314
  [3,16,-20,0,-10,-14.21,0,-6.785,-14.546,0,-6.314],
// 4 16 -20 0 -10 -14.546 0 -6.314 -14.7 0 -5.7 -20 0 10
  [4,16,-20,0,-10,-14.546,0,-6.314,-14.7,0,-5.7,-20,0,10],
// 3 16 -14.7 0 6 -20 0 10 -14.7 0 -5.7
  [3,16,-14.7,0,6,-20,0,10,-14.7,0,-5.7],
// 3 16 -20 0 -10 -5.3 0 -7.3 -13 0 -7.3
  [3,16,-20,0,-10,-5.3,0,-7.3,-13,0,-7.3],
// 4 16 -1.855 0 .768 -3.754 0 .914 -3.6 0 .3 -2.008 0 0
  [4,16,-1.855,0,.768,-3.754,0,.914,-3.6,0,.3,-2.008,0,0],
// 4 16 -4.09 0 1.385 -3.754 0 .914 -1.855 0 .768 -1.42 0 1.42
  [4,16,-4.09,0,1.385,-3.754,0,.914,-1.855,0,.768,-1.42,0,1.42],
// 4 16 -4.618 0 1.733 -4.09 0 1.385 -1.42 0 1.42 -.768 0 1.855
  [4,16,-4.618,0,1.733,-4.09,0,1.385,-1.42,0,1.42,-.768,0,1.855],
// 4 16 -4.618 0 1.733 -.768 0 1.855 -5.3 0 6 -5.3 0 1.9
  [4,16,-4.618,0,1.733,-.768,0,1.855,-5.3,0,6,-5.3,0,1.9],
// 4 16 -5.3 0 6 -.768 0 1.855 0 0 2.008 3.4 0 6
  [4,16,-5.3,0,6,-.768,0,1.855,0,0,2.008,3.4,0,6],
// 3 16 0 0 2.008 .768 0 1.855 3.4 0 6
  [3,16,0,0,2.008,.768,0,1.855,3.4,0,6],
// 4 16 -5.454 0 6.614 -5.3 0 6 3.4 0 6 3.554 0 6.614
  [4,16,-5.454,0,6.614,-5.3,0,6,3.4,0,6,3.554,0,6.614],
// 4 16 -5.79 0 7.085 -5.454 0 6.614 3.554 0 6.614 3.89 0 7.085
  [4,16,-5.79,0,7.085,-5.454,0,6.614,3.554,0,6.614,3.89,0,7.085],
// 4 16 -6.318 0 7.433 -5.79 0 7.085 3.89 0 7.085 4.418 0 7.433
  [4,16,-6.318,0,7.433,-5.79,0,7.085,3.89,0,7.085,4.418,0,7.433],
// 4 16 -7 0 7.6 -6.318 0 7.433 4.418 0 7.433 5.1 0 7.6
  [4,16,-7,0,7.6,-6.318,0,7.433,4.418,0,7.433,5.1,0,7.6],
// 3 16 12.682 0 7.433 20 0 10 12 0 7.6
  [3,16,12.682,0,7.433,20,0,10,12,0,7.6],
// 3 16 13.21 0 7.085 20 0 10 12.682 0 7.433
  [3,16,13.21,0,7.085,20,0,10,12.682,0,7.433],
// 3 16 13.546 0 6.614 20 0 10 13.21 0 7.085
  [3,16,13.546,0,6.614,20,0,10,13.21,0,7.085],
// 4 16 20 0 10 13.546 0 6.614 13.7 0 6 20 0 -10
  [4,16,20,0,10,13.546,0,6.614,13.7,0,6,20,0,-10],
// 3 16 12 0 -7.3 20 0 -10 12.682 0 -7.133
  [3,16,12,0,-7.3,20,0,-10,12.682,0,-7.133],
// 3 16 12.682 0 -7.133 20 0 -10 13.21 0 -6.785
  [3,16,12.682,0,-7.133,20,0,-10,13.21,0,-6.785],
// 3 16 13.21 0 -6.785 20 0 -10 13.546 0 -6.314
  [3,16,13.21,0,-6.785,20,0,-10,13.546,0,-6.314],
// 3 16 13.546 0 -6.314 20 0 -10 13.7 0 -5.7
  [3,16,13.546,0,-6.314,20,0,-10,13.7,0,-5.7],
// 3 16 13.7 0 -5.7 20 0 -10 13.7 0 6
  [3,16,13.7,0,-5.7,20,0,-10,13.7,0,6],
// 3 16 3.4 0 6 .768 0 1.855 1.42 0 1.42
  [3,16,3.4,0,6,.768,0,1.855,1.42,0,1.42],
// 4 16 3.4 0 6 1.42 0 1.42 1.855 0 .768 3.4 0 0
  [4,16,3.4,0,6,1.42,0,1.42,1.855,0,.768,3.4,0,0],
// 4 16 3.4 0 0 1.855 0 .768 2.008 0 0 3.554 0 -.614
  [4,16,3.4,0,0,1.855,0,.768,2.008,0,0,3.554,0,-.614],
// 3 16 2.008 0 0 1.855 0 -.768 3.554 0 -.614
  [3,16,2.008,0,0,1.855,0,-.768,3.554,0,-.614],
// 4 16 3.554 0 -.614 1.855 0 -.768 1.42 0 -1.42 3.89 0 -1.085
  [4,16,3.554,0,-.614,1.855,0,-.768,1.42,0,-1.42,3.89,0,-1.085],
// 4 16 4.418 0 -1.433 3.89 0 -1.085 1.42 0 -1.42 .768 0 -1.855
  [4,16,4.418,0,-1.433,3.89,0,-1.085,1.42,0,-1.42,.768,0,-1.855],
// 4 16 5.1 0 -1.6 4.418 0 -1.433 .768 0 -1.855 10.3 0 -5.7
  [4,16,5.1,0,-1.6,4.418,0,-1.433,.768,0,-1.855,10.3,0,-5.7],
// 3 16 10.3 0 -5.7 10.3 0 -1.6 5.1 0 -1.6
  [3,16,10.3,0,-5.7,10.3,0,-1.6,5.1,0,-1.6],
// 4 16 -1.855 0 -.768 -2.008 0 0 -3.6 0 .3 -3.6 0 -5.7
  [4,16,-1.855,0,-.768,-2.008,0,0,-3.6,0,.3,-3.6,0,-5.7],
// 3 16 -1.855 0 -.768 -3.6 0 -5.7 -1.42 0 -1.42
  [3,16,-1.855,0,-.768,-3.6,0,-5.7,-1.42,0,-1.42],
// 3 16 -1.42 0 -1.42 -3.6 0 -5.7 -.768 0 -1.855
  [3,16,-1.42,0,-1.42,-3.6,0,-5.7,-.768,0,-1.855],
// 4 16 0 0 -2.008 -.768 0 -1.855 -3.6 0 -5.7 10.3 0 -5.7
  [4,16,0,0,-2.008,-.768,0,-1.855,-3.6,0,-5.7,10.3,0,-5.7],
// 3 16 0 0 -2.008 10.3 0 -5.7 .768 0 -1.855
  [3,16,0,0,-2.008,10.3,0,-5.7,.768,0,-1.855],
// 4 16 -3.6 0 -5.7 -3.754 0 -6.314 10.454 0 -6.314 10.3 0 -5.7
  [4,16,-3.6,0,-5.7,-3.754,0,-6.314,10.454,0,-6.314,10.3,0,-5.7],
// 4 16 10.454 0 -6.314 -3.754 0 -6.314 -4.09 0 -6.785 10.79 0 -6.785
  [4,16,10.454,0,-6.314,-3.754,0,-6.314,-4.09,0,-6.785,10.79,0,-6.785],
// 4 16 10.79 0 -6.785 -4.09 0 -6.785 -4.618 0 -7.133 11.318 0 -7.133
  [4,16,10.79,0,-6.785,-4.09,0,-6.785,-4.618,0,-7.133,11.318,0,-7.133],
// 4 16 11.318 0 -7.133 -4.618 0 -7.133 -5.3 0 -7.3 12 0 -7.3
  [4,16,11.318,0,-7.133,-4.618,0,-7.133,-5.3,0,-7.3,12,0,-7.3],
// 4 16 12 0 -7.3 -5.3 0 -7.3 -20 0 -10 20 0 -10
  [4,16,12,0,-7.3,-5.3,0,-7.3,-20,0,-10,20,0,-10],
// 3 16 -20 0 10 -13 0 7.6 -7 0 7.6
  [3,16,-20,0,10,-13,0,7.6,-7,0,7.6],
// 4 16 -20 0 10 -7 0 7.6 5.1 0 7.6 20 0 10
  [4,16,-20,0,10,-7,0,7.6,5.1,0,7.6,20,0,10],
// 3 16 5.1 0 7.6 12 0 7.6 20 0 10
  [3,16,5.1,0,7.6,12,0,7.6,20,0,10],
// 4 16 10.3 0 4 6.8 0 4 6.8 0 1.9 10.3 0 1.9
  [4,16,10.3,0,4,6.8,0,4,6.8,0,1.9,10.3,0,1.9],
];
module ldraw_lib__3069bpxa(step=0, col=false, unit=2/5, alt=false, line=0.2, solid=!$preview)
    makepoly(ldraw_lib__3069bpxa(), step=step, col=col, unit=unit, alt=alt, line=line, solid=solid);
ldraw_lib__3069bpxa(line=0.2);
